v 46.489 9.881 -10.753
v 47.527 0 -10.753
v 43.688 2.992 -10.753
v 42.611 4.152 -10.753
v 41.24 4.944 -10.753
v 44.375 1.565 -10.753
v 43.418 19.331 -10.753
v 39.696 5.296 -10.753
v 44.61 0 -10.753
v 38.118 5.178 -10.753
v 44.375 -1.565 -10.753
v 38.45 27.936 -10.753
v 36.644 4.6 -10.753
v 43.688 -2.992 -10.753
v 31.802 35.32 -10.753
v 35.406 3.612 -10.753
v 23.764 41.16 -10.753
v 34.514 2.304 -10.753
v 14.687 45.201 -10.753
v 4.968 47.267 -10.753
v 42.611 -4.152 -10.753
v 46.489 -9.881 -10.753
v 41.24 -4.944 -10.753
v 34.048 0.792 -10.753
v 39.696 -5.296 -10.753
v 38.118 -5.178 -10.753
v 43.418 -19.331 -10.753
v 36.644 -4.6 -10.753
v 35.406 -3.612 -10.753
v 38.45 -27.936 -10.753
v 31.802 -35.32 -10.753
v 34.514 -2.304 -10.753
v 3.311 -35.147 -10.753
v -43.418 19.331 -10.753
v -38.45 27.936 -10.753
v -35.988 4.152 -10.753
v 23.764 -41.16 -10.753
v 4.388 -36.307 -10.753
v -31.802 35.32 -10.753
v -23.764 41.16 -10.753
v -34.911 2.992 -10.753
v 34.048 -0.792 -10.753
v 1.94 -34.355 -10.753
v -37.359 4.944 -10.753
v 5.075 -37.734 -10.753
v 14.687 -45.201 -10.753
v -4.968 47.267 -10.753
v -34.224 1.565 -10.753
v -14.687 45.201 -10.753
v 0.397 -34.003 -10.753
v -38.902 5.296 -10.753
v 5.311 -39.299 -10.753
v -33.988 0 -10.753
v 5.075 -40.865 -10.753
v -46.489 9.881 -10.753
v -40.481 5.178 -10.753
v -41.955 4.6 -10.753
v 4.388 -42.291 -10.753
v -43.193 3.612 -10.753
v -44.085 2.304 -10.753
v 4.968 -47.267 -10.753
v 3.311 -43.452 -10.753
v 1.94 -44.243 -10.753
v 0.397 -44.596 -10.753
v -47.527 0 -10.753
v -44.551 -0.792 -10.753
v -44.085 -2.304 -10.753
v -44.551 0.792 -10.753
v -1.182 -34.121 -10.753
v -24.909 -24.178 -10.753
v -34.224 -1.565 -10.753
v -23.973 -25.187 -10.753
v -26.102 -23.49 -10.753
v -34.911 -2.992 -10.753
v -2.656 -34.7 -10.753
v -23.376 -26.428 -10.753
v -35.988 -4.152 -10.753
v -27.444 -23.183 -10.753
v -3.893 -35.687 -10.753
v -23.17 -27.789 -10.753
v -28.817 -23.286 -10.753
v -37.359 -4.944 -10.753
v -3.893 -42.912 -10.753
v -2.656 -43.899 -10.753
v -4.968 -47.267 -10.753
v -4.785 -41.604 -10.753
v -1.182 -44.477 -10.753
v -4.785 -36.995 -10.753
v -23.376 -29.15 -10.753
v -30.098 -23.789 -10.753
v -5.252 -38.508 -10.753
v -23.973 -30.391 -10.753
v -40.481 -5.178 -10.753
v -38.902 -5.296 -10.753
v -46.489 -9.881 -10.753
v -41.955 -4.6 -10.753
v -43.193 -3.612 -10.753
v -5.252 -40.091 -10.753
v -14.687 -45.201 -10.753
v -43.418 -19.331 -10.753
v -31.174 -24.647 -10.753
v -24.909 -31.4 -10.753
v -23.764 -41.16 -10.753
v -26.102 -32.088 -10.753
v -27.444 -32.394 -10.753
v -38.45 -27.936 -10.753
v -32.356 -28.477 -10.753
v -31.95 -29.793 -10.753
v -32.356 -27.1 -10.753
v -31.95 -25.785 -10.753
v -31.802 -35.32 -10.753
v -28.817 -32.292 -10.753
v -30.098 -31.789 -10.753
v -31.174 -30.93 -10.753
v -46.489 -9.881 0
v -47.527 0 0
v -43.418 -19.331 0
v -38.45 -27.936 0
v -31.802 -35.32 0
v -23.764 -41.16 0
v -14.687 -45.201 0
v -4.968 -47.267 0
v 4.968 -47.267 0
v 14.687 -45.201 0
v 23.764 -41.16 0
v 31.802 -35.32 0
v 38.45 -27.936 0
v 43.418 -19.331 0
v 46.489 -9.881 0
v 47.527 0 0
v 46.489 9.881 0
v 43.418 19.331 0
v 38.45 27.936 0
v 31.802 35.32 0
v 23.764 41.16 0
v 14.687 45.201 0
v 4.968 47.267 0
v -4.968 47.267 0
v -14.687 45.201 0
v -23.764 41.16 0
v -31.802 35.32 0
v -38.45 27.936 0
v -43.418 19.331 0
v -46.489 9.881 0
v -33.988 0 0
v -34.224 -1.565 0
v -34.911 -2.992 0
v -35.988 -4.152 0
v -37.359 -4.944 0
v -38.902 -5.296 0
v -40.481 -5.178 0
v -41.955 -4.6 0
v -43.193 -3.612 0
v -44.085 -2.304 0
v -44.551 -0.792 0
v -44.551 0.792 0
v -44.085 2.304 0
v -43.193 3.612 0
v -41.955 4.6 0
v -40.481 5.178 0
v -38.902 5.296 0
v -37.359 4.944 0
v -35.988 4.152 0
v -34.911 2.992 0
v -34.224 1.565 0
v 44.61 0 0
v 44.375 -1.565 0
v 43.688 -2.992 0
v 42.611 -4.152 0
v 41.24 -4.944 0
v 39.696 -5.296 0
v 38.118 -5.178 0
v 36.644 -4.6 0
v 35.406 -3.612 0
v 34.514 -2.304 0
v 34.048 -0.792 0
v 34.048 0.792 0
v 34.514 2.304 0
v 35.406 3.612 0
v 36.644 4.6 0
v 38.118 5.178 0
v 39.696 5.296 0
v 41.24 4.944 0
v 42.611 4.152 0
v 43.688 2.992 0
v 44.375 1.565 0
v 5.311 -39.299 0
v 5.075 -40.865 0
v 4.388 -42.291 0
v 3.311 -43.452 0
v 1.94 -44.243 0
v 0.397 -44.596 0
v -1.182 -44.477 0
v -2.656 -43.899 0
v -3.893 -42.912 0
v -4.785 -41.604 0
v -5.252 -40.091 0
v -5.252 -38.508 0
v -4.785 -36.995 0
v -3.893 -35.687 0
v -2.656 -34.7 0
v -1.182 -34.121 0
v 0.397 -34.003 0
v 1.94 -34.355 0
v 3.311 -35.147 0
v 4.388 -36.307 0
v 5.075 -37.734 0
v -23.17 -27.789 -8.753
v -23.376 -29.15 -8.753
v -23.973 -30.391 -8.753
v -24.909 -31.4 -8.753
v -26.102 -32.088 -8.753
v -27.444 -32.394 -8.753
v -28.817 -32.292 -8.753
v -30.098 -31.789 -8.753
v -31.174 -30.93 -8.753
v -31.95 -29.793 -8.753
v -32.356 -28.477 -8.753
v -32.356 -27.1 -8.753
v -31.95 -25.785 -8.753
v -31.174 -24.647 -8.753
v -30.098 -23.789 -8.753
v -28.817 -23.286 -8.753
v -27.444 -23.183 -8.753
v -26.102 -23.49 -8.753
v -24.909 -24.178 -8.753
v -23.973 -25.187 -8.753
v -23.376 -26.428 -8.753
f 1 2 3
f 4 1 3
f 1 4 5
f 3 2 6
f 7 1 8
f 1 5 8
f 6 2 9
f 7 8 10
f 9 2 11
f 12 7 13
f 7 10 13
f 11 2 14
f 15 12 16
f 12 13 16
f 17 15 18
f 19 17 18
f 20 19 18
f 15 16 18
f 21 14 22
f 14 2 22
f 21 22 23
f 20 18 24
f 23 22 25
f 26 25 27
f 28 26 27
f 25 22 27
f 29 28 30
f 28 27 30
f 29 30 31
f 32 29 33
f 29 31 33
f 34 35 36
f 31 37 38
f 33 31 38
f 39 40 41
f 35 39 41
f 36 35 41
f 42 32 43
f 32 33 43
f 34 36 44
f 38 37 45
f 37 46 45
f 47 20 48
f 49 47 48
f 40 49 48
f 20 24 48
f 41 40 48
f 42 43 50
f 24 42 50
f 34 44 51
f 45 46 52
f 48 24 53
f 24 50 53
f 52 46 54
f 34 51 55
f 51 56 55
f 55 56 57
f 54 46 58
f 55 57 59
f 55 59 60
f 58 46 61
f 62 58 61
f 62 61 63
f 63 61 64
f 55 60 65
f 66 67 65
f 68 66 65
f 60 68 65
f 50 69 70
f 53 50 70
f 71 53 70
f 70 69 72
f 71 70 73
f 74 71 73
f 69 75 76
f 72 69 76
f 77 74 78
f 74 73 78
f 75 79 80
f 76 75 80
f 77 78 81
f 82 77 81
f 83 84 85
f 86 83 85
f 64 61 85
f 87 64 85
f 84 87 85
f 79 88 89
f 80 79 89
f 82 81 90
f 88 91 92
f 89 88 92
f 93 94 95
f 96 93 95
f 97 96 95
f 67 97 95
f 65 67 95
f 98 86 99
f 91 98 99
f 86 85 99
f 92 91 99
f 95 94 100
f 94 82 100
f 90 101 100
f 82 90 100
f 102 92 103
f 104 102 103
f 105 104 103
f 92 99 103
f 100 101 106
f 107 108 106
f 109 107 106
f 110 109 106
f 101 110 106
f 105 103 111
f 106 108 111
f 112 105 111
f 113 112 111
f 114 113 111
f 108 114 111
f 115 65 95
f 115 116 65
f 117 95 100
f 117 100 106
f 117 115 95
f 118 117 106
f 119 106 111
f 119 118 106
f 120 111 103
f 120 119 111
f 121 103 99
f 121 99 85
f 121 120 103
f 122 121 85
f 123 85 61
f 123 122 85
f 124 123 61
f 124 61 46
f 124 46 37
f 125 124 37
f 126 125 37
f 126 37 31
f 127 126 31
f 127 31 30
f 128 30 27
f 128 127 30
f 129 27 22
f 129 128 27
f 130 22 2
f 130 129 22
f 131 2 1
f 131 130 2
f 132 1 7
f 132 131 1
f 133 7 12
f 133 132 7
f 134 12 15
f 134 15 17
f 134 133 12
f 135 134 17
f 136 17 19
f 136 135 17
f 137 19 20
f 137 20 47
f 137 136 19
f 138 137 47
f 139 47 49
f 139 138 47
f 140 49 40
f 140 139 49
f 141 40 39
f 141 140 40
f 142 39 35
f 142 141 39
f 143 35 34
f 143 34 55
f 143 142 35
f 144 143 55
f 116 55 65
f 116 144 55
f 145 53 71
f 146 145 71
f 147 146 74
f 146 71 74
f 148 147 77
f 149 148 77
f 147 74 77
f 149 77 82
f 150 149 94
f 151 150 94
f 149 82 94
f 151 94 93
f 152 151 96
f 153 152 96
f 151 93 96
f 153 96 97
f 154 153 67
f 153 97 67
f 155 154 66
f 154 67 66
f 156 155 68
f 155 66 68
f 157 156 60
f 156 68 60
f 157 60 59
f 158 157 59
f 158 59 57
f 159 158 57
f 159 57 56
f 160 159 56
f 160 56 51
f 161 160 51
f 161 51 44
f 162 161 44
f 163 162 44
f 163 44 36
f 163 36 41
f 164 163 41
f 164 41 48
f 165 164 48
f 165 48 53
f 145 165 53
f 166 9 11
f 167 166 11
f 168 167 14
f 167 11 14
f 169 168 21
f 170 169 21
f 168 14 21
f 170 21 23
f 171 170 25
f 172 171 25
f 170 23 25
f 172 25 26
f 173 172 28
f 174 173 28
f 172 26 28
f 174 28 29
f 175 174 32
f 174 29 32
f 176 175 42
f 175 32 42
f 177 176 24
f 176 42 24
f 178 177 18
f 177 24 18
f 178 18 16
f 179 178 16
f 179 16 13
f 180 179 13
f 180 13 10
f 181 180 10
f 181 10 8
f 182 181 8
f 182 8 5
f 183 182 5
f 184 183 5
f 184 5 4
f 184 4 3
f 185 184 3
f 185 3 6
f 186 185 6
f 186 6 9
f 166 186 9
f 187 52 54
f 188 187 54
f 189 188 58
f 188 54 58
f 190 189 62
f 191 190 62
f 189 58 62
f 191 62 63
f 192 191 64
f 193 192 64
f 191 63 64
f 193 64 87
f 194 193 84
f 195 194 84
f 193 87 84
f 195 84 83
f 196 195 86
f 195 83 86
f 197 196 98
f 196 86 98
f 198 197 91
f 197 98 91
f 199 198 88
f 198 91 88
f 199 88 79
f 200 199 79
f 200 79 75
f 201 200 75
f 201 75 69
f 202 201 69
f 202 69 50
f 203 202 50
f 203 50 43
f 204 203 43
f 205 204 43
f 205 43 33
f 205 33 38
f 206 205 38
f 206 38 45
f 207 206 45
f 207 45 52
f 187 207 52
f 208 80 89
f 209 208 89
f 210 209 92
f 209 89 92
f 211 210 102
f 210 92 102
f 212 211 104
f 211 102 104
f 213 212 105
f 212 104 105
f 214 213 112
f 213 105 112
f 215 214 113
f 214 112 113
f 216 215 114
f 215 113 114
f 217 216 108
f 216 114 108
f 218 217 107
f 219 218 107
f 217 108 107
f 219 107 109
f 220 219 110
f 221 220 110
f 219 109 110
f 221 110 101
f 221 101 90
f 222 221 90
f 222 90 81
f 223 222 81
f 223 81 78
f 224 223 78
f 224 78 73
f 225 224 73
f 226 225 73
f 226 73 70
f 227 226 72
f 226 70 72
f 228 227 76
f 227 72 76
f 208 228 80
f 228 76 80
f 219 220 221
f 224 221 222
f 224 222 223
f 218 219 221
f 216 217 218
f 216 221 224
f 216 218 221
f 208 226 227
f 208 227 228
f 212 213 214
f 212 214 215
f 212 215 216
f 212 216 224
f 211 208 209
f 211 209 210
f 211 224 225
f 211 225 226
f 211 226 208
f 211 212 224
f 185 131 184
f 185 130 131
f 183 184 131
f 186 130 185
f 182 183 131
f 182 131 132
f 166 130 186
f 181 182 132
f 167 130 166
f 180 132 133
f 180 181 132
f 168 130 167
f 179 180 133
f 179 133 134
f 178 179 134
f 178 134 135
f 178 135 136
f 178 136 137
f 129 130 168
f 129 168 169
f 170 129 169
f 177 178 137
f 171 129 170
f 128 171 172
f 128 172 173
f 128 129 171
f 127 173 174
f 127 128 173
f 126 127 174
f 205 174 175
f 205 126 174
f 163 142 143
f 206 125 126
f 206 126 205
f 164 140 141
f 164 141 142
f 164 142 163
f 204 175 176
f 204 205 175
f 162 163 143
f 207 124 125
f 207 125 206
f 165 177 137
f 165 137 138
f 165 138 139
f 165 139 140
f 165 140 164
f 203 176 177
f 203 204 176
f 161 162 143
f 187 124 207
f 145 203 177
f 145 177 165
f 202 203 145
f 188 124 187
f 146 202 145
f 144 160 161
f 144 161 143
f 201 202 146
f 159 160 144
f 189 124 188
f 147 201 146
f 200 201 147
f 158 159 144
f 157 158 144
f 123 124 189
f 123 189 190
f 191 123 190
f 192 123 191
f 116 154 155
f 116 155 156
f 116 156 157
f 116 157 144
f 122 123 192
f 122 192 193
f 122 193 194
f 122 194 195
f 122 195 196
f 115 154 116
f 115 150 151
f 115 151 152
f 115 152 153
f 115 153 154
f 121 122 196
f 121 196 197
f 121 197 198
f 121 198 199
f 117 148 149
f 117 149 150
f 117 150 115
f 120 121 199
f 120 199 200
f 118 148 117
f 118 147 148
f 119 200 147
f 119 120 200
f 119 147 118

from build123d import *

# Parameters (mm, degrees)
F0_W     = 47.5273691118
F0_H     = 10.7533988893
F2_R     = 5.3111422427
F3_DEPTH = 10.7543988893
F2_R_2   = 4.6185221062
F4_DEPTH = 2


with BuildPart() as f1:
    # F0 (on Front) → F1 (revolve)
    with BuildSketch(Plane.XZ):
        with Locations((-23.7636845559, -5.3766994447)):
            Rectangle(F0_W, F0_H)
    revolve(axis=Axis((0, 0, 11.207267642), (0, 0, 1)))

    # F2 (on face) → F3 (cut, through all)
    with BuildSketch(Plane(origin=(0, 0, -10.7533988893), x_dir=(1, 0, 0), z_dir=(0, 0, -1))):
        with Locations((-39.2993532375, 0)):
            Circle(F2_R)
        with Locations((0, 39.2993532375)):
            Circle(F2_R)
        with Locations((39.2993532375, 0)):
            Circle(F2_R)
    extrude(amount=-F3_DEPTH, mode=Mode.SUBTRACT)

    # F2 (on face) → F4 (cut)
    with BuildSketch(Plane(origin=(0, 0, -10.7533988893), x_dir=(1, 0, 0), z_dir=(0, 0, -1))):
        with Locations((-27.7888391705, 27.7888391705)):
            Circle(F2_R_2)
    extrude(amount=-F4_DEPTH, mode=Mode.SUBTRACT)


solid = f1.part
